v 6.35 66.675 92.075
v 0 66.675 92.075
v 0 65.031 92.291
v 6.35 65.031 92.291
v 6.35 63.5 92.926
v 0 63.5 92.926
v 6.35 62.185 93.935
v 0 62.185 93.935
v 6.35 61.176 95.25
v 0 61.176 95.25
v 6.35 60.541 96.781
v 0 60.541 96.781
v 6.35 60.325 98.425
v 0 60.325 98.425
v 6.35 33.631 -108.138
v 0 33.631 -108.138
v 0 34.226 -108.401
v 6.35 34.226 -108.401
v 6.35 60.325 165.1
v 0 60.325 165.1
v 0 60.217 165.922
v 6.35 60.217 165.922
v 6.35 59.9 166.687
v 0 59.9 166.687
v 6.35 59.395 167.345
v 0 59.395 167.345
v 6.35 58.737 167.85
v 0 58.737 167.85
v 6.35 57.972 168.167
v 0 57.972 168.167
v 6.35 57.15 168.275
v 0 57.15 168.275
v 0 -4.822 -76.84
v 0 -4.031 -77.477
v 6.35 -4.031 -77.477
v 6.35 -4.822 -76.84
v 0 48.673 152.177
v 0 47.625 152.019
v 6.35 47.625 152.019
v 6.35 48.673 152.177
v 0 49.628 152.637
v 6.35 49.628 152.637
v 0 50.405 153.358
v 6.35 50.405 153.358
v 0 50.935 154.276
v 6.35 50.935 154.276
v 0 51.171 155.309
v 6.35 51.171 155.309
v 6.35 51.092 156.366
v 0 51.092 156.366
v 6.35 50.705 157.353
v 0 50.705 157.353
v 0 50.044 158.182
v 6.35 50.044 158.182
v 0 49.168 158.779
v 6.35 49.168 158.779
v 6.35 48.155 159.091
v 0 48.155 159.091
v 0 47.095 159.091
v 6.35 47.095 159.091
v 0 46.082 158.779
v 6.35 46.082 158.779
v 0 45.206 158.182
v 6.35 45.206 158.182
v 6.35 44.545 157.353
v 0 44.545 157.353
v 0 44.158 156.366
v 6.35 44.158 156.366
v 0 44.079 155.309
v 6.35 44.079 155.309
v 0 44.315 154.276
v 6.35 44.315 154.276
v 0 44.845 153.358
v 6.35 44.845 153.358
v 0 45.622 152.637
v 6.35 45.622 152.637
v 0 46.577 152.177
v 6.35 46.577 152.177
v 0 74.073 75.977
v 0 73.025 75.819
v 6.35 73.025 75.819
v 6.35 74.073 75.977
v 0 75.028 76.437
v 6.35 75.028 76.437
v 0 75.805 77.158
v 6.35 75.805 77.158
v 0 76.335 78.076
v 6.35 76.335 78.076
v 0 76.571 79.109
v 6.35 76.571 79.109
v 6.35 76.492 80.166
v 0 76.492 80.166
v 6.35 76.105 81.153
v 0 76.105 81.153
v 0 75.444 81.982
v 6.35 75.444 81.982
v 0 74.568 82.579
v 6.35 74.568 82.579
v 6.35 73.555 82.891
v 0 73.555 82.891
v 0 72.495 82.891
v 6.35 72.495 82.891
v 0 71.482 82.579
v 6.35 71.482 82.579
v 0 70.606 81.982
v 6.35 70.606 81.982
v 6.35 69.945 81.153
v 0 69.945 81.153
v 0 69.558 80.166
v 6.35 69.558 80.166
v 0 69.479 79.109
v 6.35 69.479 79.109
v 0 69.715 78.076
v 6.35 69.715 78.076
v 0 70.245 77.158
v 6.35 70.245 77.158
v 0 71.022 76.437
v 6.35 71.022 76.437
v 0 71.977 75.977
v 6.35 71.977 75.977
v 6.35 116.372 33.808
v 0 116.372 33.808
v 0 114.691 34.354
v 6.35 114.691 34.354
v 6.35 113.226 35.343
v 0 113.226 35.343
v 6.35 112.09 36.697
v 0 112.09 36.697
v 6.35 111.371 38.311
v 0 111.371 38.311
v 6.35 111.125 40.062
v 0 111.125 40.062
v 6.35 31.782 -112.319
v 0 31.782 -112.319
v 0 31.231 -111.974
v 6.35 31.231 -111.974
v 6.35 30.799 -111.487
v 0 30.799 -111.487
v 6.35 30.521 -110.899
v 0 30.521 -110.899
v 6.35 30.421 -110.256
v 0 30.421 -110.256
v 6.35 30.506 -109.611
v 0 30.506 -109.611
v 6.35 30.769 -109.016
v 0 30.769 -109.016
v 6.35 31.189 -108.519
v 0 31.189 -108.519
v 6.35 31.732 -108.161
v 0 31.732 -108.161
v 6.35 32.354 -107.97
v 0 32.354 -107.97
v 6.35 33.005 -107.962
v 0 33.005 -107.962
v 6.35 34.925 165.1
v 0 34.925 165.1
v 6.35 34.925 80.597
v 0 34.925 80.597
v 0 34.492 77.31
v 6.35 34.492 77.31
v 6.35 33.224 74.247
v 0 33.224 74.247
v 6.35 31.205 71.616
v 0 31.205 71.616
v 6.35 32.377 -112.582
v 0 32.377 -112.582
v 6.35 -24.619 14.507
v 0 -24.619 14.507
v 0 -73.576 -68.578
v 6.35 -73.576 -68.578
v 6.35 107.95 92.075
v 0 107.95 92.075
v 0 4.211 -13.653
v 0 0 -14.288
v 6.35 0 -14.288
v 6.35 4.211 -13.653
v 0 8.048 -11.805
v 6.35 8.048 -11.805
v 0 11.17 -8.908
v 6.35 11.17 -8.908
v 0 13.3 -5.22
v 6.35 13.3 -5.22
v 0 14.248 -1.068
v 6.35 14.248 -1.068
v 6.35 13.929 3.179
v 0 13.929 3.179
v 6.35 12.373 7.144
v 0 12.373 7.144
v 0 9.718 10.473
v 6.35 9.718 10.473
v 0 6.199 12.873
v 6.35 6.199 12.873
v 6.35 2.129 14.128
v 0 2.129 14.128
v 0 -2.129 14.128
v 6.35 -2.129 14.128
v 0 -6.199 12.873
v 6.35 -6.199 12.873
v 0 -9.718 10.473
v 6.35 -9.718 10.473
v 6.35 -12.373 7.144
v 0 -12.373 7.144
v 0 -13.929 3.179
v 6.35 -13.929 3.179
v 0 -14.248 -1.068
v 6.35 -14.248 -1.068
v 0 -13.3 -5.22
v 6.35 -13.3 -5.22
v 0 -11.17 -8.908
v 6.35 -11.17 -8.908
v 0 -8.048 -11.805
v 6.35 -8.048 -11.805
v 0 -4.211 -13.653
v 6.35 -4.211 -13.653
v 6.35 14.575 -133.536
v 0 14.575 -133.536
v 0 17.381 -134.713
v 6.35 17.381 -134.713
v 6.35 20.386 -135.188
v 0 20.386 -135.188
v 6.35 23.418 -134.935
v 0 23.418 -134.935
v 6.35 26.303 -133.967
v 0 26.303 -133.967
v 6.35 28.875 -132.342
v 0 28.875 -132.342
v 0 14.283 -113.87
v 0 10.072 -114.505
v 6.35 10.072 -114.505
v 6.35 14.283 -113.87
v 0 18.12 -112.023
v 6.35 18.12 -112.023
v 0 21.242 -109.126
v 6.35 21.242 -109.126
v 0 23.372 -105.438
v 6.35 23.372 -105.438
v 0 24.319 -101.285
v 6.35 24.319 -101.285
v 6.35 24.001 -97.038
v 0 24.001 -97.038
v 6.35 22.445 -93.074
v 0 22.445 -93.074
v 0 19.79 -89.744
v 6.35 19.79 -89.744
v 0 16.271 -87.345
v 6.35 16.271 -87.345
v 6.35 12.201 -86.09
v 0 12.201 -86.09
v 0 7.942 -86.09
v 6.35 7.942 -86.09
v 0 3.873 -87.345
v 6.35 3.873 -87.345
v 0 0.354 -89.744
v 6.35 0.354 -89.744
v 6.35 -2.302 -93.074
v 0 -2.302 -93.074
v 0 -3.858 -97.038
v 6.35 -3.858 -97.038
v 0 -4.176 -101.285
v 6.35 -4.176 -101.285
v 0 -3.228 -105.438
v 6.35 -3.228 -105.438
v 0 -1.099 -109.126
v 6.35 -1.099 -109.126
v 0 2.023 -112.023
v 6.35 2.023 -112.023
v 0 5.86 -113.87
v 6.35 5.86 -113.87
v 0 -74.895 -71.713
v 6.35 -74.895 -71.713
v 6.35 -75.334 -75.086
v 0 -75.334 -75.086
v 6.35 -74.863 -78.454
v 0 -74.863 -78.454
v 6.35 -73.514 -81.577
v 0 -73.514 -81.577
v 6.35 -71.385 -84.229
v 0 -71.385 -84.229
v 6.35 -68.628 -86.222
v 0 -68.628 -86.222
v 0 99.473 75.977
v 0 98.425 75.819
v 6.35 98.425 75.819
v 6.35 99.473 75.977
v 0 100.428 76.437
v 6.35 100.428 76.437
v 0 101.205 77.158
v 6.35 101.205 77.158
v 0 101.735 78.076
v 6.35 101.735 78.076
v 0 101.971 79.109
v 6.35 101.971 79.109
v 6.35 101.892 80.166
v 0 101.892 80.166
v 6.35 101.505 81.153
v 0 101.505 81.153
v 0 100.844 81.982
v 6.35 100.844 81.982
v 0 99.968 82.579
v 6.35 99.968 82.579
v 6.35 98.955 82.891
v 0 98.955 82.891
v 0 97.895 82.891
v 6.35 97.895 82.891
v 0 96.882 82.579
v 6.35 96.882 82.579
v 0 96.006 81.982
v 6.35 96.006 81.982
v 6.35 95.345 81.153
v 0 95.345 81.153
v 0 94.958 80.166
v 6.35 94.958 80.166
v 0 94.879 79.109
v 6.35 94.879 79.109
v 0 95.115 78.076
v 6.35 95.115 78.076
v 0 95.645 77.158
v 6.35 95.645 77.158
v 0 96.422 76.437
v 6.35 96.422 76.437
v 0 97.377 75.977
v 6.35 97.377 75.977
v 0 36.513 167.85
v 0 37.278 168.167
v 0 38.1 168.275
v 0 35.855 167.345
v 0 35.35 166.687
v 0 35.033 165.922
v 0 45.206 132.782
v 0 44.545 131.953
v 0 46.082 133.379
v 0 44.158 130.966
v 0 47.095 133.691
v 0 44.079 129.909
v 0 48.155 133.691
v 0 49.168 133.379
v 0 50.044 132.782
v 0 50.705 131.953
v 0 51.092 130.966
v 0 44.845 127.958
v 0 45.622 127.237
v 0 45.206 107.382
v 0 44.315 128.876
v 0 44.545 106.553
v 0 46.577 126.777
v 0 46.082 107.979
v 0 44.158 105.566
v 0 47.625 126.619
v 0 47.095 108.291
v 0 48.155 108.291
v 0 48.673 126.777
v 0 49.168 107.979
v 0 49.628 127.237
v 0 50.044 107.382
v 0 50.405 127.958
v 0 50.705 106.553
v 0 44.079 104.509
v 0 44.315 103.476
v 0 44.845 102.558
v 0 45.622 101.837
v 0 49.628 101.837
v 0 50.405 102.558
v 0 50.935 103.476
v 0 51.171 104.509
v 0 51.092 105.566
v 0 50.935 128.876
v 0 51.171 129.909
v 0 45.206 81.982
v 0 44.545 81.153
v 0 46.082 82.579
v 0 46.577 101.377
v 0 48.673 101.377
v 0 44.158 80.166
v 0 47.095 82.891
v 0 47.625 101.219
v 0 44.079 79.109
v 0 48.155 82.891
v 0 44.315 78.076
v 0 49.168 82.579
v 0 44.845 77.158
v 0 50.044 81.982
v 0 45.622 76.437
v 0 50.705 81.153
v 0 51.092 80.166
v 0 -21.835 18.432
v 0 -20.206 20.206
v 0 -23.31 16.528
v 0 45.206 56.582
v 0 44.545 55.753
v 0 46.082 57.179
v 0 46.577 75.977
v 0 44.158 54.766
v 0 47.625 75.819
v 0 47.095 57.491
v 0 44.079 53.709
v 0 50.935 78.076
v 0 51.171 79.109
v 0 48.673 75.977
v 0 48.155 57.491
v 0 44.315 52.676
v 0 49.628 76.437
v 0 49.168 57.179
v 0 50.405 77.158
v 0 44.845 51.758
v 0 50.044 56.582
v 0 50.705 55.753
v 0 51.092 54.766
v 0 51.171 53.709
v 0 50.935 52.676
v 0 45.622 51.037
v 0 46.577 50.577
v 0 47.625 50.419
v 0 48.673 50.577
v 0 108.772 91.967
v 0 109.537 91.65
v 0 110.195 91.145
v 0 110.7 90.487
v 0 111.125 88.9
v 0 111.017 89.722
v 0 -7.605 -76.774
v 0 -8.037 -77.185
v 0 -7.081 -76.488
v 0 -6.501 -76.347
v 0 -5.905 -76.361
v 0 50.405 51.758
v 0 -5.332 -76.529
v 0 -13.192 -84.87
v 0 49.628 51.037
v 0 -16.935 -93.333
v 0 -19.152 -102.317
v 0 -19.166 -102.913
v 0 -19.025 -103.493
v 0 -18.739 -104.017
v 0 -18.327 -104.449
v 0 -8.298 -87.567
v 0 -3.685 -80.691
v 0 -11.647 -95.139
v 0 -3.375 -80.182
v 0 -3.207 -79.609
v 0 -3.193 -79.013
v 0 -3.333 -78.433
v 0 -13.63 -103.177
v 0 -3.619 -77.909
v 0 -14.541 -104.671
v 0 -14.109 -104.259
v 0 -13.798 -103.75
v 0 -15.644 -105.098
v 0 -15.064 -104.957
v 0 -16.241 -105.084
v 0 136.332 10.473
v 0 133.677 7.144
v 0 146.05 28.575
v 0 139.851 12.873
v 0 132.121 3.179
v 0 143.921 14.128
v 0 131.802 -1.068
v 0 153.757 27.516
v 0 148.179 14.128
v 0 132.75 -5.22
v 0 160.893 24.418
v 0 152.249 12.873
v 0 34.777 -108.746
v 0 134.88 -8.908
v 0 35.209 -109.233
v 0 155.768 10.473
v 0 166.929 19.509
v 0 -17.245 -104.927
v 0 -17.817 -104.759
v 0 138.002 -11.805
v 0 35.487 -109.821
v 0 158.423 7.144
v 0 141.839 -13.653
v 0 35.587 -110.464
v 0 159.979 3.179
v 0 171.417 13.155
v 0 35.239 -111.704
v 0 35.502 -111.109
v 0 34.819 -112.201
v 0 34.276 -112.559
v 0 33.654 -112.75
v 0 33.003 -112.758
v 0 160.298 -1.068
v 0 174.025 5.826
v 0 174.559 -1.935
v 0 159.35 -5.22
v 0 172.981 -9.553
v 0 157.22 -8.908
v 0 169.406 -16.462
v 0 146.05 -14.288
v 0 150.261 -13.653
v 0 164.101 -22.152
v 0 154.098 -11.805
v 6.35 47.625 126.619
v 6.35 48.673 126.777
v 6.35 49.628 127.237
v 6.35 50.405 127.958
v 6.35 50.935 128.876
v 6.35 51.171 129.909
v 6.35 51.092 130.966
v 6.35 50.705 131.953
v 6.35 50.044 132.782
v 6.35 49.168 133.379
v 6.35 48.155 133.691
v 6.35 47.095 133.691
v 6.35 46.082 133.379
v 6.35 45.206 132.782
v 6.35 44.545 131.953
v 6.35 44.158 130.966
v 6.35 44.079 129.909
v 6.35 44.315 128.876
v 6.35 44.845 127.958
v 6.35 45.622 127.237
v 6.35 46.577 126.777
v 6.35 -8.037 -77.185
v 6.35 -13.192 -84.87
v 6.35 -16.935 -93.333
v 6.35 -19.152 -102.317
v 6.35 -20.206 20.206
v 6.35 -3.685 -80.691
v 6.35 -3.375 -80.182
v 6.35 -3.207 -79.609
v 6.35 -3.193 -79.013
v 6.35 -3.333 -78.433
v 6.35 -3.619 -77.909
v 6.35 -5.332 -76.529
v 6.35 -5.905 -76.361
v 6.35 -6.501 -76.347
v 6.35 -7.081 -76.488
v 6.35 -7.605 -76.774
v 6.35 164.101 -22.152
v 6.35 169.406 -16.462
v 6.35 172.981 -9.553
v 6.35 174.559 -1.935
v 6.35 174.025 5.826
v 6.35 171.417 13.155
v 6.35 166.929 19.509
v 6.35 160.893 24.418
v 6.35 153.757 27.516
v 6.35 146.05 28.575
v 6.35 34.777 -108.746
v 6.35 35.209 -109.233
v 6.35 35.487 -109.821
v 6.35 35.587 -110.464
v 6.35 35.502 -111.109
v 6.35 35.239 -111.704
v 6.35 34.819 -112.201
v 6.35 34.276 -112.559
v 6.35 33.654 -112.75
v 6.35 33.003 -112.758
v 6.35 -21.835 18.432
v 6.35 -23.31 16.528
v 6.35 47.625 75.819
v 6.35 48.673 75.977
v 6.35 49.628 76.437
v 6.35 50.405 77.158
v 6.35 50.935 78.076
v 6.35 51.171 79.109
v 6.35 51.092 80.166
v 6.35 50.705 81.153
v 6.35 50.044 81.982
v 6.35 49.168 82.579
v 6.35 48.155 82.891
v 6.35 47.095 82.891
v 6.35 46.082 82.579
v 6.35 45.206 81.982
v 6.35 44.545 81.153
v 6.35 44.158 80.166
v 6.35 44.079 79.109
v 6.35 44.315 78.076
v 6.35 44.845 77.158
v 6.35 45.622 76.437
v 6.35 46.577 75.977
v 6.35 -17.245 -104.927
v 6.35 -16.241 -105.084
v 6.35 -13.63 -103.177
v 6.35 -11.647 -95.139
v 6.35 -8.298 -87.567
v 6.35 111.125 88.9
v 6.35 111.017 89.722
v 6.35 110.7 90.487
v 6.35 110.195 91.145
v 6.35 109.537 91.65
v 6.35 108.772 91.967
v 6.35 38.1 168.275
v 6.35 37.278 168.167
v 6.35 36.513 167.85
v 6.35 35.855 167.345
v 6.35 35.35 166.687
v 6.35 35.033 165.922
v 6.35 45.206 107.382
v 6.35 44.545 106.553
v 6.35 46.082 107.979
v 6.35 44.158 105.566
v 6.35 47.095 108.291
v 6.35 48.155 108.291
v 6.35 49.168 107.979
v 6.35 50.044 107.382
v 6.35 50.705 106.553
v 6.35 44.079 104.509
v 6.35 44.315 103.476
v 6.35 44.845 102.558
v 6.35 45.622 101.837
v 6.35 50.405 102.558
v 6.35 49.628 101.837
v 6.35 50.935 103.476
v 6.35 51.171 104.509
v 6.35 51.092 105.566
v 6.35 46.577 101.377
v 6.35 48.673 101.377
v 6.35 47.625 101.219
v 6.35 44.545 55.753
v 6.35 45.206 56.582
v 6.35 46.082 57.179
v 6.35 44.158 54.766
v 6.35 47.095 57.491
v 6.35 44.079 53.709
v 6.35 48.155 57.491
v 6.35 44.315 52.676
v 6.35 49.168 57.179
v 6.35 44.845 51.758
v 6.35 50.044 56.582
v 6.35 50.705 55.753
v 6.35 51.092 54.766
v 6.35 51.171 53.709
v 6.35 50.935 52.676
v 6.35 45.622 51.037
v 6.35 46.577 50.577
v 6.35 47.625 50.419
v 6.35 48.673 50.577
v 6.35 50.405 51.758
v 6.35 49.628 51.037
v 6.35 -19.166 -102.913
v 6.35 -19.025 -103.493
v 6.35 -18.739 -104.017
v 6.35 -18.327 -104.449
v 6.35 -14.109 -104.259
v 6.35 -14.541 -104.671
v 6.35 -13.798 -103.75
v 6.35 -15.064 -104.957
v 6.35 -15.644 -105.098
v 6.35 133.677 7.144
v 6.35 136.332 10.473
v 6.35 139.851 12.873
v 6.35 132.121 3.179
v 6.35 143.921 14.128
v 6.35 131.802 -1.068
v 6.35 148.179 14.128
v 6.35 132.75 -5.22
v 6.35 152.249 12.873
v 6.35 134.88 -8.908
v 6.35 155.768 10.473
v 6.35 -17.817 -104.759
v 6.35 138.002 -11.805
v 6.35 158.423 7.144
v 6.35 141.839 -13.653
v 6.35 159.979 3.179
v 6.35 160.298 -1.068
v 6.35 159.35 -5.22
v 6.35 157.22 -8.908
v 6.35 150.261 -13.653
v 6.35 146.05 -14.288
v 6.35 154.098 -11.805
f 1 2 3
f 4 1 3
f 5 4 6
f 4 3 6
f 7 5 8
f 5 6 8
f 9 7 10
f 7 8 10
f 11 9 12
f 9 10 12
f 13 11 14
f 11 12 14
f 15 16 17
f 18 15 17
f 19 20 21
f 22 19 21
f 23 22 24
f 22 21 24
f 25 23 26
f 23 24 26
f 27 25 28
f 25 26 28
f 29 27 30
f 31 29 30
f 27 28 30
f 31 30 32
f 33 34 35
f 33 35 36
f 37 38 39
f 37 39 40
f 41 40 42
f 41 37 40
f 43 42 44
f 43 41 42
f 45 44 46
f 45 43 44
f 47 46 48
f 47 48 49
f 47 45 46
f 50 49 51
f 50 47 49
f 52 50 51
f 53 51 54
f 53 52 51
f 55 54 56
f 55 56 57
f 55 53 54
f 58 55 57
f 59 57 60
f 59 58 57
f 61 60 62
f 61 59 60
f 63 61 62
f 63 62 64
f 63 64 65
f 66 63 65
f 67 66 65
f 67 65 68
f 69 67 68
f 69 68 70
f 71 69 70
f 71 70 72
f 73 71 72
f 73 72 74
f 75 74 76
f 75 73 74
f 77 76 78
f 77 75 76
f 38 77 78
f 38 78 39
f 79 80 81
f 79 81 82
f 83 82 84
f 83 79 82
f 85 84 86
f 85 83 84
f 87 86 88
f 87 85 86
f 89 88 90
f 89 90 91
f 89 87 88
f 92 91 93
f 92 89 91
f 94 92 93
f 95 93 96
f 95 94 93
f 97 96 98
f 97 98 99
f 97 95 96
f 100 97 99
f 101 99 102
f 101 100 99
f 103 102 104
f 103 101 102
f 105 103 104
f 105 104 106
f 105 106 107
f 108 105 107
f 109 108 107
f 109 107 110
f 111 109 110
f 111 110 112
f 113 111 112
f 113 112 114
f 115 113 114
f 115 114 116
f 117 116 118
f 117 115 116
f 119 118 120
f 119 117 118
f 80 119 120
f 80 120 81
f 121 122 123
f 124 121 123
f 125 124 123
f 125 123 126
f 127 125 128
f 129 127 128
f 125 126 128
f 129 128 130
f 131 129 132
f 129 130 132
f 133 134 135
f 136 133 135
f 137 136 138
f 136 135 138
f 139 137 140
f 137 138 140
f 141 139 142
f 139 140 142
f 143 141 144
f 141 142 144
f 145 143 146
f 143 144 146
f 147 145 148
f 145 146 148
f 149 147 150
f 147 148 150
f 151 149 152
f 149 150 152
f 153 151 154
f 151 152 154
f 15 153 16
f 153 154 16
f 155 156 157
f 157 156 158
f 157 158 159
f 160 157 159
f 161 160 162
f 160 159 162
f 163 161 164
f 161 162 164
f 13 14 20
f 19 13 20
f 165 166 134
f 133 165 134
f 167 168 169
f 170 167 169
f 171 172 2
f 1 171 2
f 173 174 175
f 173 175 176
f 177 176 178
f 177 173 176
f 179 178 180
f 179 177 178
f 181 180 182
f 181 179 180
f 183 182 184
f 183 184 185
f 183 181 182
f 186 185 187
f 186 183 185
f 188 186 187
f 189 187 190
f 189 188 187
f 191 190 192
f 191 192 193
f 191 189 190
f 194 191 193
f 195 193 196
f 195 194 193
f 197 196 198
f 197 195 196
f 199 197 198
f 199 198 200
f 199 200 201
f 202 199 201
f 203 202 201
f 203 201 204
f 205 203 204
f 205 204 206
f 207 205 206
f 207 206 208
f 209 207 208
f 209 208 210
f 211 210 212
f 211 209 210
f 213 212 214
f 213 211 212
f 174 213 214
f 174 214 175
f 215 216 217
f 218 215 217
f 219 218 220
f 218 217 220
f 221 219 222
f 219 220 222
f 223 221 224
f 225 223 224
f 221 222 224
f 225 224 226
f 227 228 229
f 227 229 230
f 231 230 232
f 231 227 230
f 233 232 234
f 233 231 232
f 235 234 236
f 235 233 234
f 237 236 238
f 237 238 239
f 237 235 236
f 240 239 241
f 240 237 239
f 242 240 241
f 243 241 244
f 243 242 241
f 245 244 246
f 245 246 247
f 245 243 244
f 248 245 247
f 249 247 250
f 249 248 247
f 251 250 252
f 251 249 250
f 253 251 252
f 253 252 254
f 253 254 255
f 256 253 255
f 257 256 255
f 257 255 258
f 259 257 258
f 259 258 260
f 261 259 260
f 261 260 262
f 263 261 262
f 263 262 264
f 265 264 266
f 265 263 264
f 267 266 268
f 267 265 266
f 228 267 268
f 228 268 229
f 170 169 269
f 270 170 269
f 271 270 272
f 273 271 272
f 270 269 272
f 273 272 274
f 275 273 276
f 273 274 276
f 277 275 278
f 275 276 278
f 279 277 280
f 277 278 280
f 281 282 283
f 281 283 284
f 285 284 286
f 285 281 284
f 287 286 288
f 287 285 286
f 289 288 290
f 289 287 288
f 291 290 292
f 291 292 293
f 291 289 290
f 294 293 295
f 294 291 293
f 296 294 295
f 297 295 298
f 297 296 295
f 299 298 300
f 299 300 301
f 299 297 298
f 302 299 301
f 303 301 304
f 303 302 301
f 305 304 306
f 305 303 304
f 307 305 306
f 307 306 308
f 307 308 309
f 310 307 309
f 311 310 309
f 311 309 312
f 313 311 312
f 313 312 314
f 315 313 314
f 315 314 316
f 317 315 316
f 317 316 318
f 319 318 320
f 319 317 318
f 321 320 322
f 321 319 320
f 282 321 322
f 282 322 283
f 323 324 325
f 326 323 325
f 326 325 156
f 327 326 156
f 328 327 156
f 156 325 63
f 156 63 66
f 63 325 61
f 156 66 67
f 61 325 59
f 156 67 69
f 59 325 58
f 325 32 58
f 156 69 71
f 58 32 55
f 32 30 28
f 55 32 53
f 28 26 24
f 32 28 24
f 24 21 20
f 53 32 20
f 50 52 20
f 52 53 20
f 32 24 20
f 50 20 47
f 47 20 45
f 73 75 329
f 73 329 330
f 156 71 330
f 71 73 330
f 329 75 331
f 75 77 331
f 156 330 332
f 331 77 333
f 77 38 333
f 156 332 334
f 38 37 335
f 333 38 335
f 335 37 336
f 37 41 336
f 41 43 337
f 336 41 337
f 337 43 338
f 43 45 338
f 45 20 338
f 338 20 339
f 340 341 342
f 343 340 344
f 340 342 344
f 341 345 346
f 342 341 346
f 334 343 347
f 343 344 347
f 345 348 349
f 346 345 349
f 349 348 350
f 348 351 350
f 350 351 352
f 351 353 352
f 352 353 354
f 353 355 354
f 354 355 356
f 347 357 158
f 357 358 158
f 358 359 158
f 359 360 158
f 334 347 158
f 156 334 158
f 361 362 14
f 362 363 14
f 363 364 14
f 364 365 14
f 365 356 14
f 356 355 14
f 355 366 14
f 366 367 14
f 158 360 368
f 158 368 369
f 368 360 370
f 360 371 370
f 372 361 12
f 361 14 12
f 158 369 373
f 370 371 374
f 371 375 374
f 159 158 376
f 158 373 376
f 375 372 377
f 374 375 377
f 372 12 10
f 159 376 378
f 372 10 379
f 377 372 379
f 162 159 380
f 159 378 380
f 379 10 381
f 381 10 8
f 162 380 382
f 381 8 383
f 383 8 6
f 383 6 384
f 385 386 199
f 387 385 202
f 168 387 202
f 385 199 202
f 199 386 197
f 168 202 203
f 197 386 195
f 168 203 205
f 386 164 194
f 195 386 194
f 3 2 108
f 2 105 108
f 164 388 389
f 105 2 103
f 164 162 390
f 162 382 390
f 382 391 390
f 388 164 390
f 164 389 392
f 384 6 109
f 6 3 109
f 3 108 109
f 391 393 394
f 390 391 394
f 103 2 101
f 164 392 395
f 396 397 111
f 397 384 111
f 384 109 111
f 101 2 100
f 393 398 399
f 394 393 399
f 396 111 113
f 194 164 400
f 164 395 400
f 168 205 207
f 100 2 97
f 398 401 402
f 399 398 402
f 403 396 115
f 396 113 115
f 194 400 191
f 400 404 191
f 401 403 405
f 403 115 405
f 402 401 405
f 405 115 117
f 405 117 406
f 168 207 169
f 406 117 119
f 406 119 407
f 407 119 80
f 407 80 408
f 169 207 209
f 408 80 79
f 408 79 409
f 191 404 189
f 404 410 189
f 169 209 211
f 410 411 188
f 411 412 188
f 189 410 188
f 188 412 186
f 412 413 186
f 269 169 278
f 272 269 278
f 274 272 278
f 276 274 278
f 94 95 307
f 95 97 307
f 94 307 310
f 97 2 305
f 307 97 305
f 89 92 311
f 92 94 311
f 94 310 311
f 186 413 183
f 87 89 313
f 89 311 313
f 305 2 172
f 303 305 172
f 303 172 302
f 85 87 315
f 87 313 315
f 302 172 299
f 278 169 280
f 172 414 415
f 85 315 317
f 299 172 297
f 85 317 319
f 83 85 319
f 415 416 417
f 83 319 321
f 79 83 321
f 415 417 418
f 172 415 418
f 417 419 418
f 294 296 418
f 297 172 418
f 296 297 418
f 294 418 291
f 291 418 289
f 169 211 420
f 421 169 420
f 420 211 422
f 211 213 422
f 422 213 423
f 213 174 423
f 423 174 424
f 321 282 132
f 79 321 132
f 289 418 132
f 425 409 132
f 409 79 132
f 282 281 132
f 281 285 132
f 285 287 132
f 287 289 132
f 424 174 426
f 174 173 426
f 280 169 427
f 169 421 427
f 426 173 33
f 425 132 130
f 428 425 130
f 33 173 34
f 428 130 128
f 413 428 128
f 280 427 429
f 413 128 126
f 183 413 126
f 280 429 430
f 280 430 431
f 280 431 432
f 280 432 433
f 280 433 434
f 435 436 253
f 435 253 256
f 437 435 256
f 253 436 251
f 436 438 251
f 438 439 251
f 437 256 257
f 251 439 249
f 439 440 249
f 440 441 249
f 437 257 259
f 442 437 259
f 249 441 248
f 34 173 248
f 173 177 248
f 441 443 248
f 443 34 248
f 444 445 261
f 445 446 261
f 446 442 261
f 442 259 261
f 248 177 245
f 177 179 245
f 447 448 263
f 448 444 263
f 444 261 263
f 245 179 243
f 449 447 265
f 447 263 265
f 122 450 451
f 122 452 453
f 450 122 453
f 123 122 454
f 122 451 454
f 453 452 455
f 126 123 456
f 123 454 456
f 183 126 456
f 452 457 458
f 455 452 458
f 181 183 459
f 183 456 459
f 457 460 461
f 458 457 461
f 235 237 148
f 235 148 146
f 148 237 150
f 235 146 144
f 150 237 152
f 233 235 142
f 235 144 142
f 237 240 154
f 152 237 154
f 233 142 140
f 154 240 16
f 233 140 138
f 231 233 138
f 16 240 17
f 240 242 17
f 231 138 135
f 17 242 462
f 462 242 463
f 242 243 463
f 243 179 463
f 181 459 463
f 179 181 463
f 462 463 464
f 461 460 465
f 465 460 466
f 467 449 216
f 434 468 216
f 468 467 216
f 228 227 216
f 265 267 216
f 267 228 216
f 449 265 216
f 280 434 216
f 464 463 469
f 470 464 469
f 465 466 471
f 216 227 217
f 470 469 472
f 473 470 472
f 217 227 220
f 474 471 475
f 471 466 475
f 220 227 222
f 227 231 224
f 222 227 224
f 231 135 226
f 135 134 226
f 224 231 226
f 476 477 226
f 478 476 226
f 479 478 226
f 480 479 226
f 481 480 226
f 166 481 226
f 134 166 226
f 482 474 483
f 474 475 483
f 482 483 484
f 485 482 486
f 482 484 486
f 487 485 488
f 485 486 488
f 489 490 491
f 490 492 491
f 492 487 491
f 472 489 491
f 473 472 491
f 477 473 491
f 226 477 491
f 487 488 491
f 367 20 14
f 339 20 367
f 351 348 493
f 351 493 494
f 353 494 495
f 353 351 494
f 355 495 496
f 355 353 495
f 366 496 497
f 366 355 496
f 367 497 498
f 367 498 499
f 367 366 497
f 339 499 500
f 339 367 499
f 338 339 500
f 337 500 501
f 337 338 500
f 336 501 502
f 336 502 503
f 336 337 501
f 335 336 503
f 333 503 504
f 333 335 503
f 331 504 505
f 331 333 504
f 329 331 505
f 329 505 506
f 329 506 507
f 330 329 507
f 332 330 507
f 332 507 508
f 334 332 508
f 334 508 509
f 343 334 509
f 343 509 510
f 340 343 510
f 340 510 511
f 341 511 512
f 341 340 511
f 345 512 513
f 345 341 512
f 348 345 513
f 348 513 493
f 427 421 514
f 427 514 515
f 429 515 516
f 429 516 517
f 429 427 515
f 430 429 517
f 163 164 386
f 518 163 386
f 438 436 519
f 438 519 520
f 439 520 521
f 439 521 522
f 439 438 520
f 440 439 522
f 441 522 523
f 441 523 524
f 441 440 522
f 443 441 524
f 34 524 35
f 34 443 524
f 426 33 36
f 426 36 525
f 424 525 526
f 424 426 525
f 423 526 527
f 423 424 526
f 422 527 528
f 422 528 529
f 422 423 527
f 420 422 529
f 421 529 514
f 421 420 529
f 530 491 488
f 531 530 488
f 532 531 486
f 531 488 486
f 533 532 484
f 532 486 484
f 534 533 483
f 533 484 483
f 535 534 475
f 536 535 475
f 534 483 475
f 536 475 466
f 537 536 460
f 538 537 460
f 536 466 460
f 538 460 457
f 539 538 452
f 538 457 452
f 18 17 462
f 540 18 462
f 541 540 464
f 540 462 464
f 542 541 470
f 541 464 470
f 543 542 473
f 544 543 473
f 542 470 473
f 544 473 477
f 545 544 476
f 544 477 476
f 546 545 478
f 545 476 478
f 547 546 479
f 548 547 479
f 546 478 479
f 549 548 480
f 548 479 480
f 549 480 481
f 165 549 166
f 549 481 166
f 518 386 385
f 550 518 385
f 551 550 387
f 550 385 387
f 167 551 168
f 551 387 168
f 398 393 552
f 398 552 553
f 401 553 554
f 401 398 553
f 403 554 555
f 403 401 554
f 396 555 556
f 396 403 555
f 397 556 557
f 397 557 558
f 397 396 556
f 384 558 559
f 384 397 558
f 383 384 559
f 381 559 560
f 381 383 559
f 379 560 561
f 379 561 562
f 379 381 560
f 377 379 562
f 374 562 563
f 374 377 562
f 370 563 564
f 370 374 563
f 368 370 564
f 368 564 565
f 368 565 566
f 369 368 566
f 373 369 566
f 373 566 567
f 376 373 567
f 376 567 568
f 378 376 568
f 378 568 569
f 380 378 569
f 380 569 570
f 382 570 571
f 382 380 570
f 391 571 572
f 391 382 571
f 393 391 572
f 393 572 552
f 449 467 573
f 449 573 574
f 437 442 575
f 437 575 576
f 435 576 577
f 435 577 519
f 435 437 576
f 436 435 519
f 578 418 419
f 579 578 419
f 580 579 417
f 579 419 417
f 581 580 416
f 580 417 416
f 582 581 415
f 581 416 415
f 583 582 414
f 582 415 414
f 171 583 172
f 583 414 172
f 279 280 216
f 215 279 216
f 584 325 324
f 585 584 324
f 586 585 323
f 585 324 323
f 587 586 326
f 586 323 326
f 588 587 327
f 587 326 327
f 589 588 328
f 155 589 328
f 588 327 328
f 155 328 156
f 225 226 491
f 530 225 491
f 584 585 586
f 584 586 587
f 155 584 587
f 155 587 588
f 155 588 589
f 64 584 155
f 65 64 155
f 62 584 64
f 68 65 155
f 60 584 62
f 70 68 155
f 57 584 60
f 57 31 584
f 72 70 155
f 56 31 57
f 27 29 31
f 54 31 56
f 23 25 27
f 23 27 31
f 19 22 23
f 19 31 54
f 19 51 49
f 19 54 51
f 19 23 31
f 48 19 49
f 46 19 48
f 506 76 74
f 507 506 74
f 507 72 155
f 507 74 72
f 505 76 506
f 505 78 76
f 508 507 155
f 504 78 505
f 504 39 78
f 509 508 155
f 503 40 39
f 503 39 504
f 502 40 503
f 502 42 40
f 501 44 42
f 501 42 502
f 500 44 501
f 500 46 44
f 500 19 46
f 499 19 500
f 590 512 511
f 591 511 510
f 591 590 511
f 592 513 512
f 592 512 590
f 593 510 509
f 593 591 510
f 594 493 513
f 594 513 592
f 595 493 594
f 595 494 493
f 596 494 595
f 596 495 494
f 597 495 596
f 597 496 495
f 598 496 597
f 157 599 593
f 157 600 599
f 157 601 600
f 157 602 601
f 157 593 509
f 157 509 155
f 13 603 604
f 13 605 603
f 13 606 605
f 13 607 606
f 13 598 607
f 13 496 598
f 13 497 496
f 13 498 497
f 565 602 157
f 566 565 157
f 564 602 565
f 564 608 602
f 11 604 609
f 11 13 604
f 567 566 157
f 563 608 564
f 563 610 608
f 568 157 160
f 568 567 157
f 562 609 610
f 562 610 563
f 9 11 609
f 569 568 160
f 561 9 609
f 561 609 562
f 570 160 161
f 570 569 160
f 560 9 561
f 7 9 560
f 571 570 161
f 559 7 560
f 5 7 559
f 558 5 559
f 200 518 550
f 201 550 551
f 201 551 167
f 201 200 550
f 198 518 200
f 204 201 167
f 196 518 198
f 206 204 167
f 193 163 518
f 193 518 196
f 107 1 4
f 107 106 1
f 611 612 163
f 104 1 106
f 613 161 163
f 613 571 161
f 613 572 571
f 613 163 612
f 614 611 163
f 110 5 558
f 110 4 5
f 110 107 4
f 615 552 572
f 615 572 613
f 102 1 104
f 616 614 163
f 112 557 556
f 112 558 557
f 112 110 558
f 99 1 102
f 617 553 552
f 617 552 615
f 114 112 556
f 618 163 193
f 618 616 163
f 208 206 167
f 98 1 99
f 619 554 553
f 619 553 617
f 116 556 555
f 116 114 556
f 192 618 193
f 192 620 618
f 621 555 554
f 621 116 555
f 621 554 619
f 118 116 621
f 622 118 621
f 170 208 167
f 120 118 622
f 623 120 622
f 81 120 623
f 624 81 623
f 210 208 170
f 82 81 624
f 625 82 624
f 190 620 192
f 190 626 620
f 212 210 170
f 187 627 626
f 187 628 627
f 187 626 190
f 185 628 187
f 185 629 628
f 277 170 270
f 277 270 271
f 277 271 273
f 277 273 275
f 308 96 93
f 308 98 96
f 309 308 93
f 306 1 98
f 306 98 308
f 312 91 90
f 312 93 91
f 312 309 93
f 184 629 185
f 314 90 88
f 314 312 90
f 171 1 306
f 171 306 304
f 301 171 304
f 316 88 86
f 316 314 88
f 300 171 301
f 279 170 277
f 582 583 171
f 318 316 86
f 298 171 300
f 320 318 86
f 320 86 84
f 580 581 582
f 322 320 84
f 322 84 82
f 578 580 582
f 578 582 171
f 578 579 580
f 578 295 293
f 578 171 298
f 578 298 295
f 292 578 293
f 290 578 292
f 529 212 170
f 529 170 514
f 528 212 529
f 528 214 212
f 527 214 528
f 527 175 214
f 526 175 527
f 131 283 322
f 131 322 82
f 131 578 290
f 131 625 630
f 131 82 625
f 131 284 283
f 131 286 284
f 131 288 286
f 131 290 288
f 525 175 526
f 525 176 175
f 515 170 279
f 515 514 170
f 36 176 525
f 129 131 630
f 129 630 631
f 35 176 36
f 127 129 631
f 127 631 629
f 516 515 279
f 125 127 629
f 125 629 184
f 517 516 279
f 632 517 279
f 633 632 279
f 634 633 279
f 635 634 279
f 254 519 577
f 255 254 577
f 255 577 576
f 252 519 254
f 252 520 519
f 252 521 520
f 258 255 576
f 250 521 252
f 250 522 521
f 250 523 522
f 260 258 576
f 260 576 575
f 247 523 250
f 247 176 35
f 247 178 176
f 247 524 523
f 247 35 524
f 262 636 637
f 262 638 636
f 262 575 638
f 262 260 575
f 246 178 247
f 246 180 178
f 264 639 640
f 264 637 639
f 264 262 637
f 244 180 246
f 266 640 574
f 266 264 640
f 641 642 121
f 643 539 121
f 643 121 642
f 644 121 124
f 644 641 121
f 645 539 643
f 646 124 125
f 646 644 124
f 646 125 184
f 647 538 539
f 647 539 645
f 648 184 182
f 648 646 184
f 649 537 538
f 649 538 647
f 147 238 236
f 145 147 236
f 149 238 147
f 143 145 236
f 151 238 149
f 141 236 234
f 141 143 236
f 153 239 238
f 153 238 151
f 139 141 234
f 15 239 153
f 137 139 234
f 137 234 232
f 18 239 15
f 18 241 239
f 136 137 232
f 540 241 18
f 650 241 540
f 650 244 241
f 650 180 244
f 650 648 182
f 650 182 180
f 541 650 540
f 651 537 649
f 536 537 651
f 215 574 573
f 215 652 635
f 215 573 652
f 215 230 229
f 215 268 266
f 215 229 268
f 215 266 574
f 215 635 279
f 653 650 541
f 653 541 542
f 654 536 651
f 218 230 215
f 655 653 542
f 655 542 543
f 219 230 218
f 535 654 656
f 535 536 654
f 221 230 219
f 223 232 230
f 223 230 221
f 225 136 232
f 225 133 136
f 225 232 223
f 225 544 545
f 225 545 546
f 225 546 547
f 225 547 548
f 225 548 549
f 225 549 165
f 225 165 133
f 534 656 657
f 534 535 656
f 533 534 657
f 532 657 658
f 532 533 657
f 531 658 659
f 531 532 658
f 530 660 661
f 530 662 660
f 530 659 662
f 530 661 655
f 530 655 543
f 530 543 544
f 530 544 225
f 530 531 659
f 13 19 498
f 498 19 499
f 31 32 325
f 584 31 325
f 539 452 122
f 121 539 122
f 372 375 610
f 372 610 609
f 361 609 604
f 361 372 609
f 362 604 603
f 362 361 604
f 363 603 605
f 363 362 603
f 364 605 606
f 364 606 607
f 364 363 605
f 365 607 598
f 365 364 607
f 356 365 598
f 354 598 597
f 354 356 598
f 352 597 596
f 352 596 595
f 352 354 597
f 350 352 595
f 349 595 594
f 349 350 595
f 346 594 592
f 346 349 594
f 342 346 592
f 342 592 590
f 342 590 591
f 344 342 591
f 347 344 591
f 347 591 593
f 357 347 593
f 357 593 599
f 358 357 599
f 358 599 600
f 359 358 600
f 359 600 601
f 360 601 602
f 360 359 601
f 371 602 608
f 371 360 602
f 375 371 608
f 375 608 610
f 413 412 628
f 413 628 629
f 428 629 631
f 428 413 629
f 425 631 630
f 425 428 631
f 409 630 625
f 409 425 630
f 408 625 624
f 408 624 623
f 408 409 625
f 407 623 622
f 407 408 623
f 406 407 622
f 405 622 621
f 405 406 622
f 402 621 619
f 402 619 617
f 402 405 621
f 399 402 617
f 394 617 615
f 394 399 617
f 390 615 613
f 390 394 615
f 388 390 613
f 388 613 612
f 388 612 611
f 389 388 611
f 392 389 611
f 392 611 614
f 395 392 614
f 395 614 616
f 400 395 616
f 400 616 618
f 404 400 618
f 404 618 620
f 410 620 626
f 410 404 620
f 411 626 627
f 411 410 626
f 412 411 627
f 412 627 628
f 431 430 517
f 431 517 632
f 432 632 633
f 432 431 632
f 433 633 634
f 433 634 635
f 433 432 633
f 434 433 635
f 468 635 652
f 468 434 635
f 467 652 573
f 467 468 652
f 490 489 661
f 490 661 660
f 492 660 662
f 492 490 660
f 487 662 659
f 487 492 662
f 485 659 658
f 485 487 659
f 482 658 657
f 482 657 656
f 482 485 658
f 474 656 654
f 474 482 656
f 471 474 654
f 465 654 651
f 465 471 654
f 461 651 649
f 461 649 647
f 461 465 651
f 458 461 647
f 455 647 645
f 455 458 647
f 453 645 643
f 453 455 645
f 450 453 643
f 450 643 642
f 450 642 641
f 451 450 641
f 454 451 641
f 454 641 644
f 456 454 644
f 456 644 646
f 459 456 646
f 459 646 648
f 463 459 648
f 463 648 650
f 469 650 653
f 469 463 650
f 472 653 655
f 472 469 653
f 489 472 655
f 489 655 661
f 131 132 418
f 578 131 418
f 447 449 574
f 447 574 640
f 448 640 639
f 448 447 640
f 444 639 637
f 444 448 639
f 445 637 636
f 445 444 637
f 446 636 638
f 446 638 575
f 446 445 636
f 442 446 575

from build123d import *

# Parameters (mm, degrees)
SKETCH2_R           = 14.2875
SKETCH2_R_2         = 3.556
BOSS_EXTRUDE1_DEPTH = 6.35


with BuildPart() as part:
    # Sketch2 → Boss-Extrude1 (new body)
    with BuildSketch(Plane(origin=(0, 0, 0), x_dir=(0, 0, -1), z_dir=(1, 0, 0))):
        with BuildLine():
            Line((-165.1, 34.925), (-80.596664787, 34.925))
            ThreePointArc((-80.596664787, 34.925), (-75.736585196, 33.958270063), (-71.616408666, 31.205256121))
            Line((-71.616408666, 31.205256121), (-20.205576272, -20.205576272))
            ThreePointArc((-20.205576272, -20.205576272), (-17.495774254, -22.592664922), (-14.50653847, -24.618914814))
            Line((-14.50653847, -24.618914814), (68.578013642, -73.575957012))
            ThreePointArc((68.578013642, -73.575957012), (78.454344121, -74.862548761), (86.221769537, -68.628422964))
            Line((86.221769537, -68.628422964), (133.536181692, 14.57458872))
            ThreePointArc((133.536181692, 14.57458872), (135.152284875, 21.909694343), (132.341634936, 28.875023547))
            Line((132.341634936, 28.875023547), (22.151863474, 164.100639036))
            ThreePointArc((22.151863474, 164.100639036), (-9.579695356, 172.971368128), (-28.575, 146.05))
            Line((-28.575, 146.05), (-33.807973228, 116.372334072))
            ThreePointArc((-33.807973228, 116.372334072), (-35.979801138, 112.610617786), (-40.061502459, 111.125))
            Line((-40.061502459, 111.125), (-88.9, 111.125))
            ThreePointArc((-88.9, 111.125), (-91.14506403, 110.19506403), (-92.075, 107.95))
            Line((-92.075, 107.95), (-92.075, 66.675))
            ThreePointArc((-92.075, 66.675), (-93.934871939, 62.184871939), (-98.425, 60.325))
            Line((-98.425, 60.325), (-165.1, 60.325))
            ThreePointArc((-165.1, 60.325), (-167.34506403, 59.39506403), (-168.275, 57.15))
            Line((-168.275, 57.15), (-168.275, 38.1))
            ThreePointArc((-168.275, 38.1), (-167.34506403, 35.85493597), (-165.1, 34.925))
        make_face()
        with Locations((0, 146.05)):
            Circle(SKETCH2_R, mode=Mode.SUBTRACT)
        Circle(SKETCH2_R, mode=Mode.SUBTRACT)
        with Locations((-53.975, 47.625)):
            Circle(SKETCH2_R_2, mode=Mode.SUBTRACT)
        with Locations((-79.375, 47.625)):
            Circle(SKETCH2_R_2, mode=Mode.SUBTRACT)
        with Locations((-104.775, 47.625)):
            Circle(SKETCH2_R_2, mode=Mode.SUBTRACT)
        with Locations((-130.175, 47.625)):
            Circle(SKETCH2_R_2, mode=Mode.SUBTRACT)
        with Locations((-155.575, 47.625)):
            Circle(SKETCH2_R_2, mode=Mode.SUBTRACT)
        with Locations((100.217738322, 10.071728166)):
            Circle(SKETCH2_R, mode=Mode.SUBTRACT)
        with Locations((-79.375, 73.025)):
            Circle(SKETCH2_R_2, mode=Mode.SUBTRACT)
        with Locations((-79.375, 98.425)):
            Circle(SKETCH2_R_2, mode=Mode.SUBTRACT)
        with BuildLine():
            Line((108.137843951, 33.631444269), (108.400752916, 34.22590106))
            ThreePointArc((108.400752916, 34.22590106), (111.416042328, 35.39192926), (112.582070528, 32.376639848))
            Line((112.582070528, 32.376639848), (112.319161563, 31.782183057))
            ThreePointArc((112.319161563, 31.782183057), (109.303872151, 30.616154857), (108.137843951, 33.631444269))
        make_face(mode=Mode.SUBTRACT)
        with BuildLine():
            Line((77.477027734, -4.031327927), (76.839593557, -4.822487627))
            ThreePointArc((76.839593557, -4.822487627), (76.346823941, -6.501290334), (77.185475983, -8.036823849))
            ThreePointArc((77.185475983, -8.036823849), (89.019434317, -15.248472927), (102.316672427, -19.151537226))
            ThreePointArc((102.316672427, -19.151537226), (104.016943026, -18.738886877), (104.927428038, -17.244826147))
            Line((104.927428038, -17.244826147), (105.083882379, -16.24094466))
            ThreePointArc((105.083882379, -16.24094466), (104.67123203, -14.54067406), (103.1771713, -13.630189049))
            ThreePointArc((103.1771713, -13.630189049), (91.279642465, -10.137973624), (80.691363956, -3.685445501))
            ThreePointArc((80.691363956, -3.685445501), (79.012561249, -3.192675886), (77.477027734, -4.031327927))
        make_face(mode=Mode.SUBTRACT)
    extrude(amount=BOSS_EXTRUDE1_DEPTH)


solid = part.part
